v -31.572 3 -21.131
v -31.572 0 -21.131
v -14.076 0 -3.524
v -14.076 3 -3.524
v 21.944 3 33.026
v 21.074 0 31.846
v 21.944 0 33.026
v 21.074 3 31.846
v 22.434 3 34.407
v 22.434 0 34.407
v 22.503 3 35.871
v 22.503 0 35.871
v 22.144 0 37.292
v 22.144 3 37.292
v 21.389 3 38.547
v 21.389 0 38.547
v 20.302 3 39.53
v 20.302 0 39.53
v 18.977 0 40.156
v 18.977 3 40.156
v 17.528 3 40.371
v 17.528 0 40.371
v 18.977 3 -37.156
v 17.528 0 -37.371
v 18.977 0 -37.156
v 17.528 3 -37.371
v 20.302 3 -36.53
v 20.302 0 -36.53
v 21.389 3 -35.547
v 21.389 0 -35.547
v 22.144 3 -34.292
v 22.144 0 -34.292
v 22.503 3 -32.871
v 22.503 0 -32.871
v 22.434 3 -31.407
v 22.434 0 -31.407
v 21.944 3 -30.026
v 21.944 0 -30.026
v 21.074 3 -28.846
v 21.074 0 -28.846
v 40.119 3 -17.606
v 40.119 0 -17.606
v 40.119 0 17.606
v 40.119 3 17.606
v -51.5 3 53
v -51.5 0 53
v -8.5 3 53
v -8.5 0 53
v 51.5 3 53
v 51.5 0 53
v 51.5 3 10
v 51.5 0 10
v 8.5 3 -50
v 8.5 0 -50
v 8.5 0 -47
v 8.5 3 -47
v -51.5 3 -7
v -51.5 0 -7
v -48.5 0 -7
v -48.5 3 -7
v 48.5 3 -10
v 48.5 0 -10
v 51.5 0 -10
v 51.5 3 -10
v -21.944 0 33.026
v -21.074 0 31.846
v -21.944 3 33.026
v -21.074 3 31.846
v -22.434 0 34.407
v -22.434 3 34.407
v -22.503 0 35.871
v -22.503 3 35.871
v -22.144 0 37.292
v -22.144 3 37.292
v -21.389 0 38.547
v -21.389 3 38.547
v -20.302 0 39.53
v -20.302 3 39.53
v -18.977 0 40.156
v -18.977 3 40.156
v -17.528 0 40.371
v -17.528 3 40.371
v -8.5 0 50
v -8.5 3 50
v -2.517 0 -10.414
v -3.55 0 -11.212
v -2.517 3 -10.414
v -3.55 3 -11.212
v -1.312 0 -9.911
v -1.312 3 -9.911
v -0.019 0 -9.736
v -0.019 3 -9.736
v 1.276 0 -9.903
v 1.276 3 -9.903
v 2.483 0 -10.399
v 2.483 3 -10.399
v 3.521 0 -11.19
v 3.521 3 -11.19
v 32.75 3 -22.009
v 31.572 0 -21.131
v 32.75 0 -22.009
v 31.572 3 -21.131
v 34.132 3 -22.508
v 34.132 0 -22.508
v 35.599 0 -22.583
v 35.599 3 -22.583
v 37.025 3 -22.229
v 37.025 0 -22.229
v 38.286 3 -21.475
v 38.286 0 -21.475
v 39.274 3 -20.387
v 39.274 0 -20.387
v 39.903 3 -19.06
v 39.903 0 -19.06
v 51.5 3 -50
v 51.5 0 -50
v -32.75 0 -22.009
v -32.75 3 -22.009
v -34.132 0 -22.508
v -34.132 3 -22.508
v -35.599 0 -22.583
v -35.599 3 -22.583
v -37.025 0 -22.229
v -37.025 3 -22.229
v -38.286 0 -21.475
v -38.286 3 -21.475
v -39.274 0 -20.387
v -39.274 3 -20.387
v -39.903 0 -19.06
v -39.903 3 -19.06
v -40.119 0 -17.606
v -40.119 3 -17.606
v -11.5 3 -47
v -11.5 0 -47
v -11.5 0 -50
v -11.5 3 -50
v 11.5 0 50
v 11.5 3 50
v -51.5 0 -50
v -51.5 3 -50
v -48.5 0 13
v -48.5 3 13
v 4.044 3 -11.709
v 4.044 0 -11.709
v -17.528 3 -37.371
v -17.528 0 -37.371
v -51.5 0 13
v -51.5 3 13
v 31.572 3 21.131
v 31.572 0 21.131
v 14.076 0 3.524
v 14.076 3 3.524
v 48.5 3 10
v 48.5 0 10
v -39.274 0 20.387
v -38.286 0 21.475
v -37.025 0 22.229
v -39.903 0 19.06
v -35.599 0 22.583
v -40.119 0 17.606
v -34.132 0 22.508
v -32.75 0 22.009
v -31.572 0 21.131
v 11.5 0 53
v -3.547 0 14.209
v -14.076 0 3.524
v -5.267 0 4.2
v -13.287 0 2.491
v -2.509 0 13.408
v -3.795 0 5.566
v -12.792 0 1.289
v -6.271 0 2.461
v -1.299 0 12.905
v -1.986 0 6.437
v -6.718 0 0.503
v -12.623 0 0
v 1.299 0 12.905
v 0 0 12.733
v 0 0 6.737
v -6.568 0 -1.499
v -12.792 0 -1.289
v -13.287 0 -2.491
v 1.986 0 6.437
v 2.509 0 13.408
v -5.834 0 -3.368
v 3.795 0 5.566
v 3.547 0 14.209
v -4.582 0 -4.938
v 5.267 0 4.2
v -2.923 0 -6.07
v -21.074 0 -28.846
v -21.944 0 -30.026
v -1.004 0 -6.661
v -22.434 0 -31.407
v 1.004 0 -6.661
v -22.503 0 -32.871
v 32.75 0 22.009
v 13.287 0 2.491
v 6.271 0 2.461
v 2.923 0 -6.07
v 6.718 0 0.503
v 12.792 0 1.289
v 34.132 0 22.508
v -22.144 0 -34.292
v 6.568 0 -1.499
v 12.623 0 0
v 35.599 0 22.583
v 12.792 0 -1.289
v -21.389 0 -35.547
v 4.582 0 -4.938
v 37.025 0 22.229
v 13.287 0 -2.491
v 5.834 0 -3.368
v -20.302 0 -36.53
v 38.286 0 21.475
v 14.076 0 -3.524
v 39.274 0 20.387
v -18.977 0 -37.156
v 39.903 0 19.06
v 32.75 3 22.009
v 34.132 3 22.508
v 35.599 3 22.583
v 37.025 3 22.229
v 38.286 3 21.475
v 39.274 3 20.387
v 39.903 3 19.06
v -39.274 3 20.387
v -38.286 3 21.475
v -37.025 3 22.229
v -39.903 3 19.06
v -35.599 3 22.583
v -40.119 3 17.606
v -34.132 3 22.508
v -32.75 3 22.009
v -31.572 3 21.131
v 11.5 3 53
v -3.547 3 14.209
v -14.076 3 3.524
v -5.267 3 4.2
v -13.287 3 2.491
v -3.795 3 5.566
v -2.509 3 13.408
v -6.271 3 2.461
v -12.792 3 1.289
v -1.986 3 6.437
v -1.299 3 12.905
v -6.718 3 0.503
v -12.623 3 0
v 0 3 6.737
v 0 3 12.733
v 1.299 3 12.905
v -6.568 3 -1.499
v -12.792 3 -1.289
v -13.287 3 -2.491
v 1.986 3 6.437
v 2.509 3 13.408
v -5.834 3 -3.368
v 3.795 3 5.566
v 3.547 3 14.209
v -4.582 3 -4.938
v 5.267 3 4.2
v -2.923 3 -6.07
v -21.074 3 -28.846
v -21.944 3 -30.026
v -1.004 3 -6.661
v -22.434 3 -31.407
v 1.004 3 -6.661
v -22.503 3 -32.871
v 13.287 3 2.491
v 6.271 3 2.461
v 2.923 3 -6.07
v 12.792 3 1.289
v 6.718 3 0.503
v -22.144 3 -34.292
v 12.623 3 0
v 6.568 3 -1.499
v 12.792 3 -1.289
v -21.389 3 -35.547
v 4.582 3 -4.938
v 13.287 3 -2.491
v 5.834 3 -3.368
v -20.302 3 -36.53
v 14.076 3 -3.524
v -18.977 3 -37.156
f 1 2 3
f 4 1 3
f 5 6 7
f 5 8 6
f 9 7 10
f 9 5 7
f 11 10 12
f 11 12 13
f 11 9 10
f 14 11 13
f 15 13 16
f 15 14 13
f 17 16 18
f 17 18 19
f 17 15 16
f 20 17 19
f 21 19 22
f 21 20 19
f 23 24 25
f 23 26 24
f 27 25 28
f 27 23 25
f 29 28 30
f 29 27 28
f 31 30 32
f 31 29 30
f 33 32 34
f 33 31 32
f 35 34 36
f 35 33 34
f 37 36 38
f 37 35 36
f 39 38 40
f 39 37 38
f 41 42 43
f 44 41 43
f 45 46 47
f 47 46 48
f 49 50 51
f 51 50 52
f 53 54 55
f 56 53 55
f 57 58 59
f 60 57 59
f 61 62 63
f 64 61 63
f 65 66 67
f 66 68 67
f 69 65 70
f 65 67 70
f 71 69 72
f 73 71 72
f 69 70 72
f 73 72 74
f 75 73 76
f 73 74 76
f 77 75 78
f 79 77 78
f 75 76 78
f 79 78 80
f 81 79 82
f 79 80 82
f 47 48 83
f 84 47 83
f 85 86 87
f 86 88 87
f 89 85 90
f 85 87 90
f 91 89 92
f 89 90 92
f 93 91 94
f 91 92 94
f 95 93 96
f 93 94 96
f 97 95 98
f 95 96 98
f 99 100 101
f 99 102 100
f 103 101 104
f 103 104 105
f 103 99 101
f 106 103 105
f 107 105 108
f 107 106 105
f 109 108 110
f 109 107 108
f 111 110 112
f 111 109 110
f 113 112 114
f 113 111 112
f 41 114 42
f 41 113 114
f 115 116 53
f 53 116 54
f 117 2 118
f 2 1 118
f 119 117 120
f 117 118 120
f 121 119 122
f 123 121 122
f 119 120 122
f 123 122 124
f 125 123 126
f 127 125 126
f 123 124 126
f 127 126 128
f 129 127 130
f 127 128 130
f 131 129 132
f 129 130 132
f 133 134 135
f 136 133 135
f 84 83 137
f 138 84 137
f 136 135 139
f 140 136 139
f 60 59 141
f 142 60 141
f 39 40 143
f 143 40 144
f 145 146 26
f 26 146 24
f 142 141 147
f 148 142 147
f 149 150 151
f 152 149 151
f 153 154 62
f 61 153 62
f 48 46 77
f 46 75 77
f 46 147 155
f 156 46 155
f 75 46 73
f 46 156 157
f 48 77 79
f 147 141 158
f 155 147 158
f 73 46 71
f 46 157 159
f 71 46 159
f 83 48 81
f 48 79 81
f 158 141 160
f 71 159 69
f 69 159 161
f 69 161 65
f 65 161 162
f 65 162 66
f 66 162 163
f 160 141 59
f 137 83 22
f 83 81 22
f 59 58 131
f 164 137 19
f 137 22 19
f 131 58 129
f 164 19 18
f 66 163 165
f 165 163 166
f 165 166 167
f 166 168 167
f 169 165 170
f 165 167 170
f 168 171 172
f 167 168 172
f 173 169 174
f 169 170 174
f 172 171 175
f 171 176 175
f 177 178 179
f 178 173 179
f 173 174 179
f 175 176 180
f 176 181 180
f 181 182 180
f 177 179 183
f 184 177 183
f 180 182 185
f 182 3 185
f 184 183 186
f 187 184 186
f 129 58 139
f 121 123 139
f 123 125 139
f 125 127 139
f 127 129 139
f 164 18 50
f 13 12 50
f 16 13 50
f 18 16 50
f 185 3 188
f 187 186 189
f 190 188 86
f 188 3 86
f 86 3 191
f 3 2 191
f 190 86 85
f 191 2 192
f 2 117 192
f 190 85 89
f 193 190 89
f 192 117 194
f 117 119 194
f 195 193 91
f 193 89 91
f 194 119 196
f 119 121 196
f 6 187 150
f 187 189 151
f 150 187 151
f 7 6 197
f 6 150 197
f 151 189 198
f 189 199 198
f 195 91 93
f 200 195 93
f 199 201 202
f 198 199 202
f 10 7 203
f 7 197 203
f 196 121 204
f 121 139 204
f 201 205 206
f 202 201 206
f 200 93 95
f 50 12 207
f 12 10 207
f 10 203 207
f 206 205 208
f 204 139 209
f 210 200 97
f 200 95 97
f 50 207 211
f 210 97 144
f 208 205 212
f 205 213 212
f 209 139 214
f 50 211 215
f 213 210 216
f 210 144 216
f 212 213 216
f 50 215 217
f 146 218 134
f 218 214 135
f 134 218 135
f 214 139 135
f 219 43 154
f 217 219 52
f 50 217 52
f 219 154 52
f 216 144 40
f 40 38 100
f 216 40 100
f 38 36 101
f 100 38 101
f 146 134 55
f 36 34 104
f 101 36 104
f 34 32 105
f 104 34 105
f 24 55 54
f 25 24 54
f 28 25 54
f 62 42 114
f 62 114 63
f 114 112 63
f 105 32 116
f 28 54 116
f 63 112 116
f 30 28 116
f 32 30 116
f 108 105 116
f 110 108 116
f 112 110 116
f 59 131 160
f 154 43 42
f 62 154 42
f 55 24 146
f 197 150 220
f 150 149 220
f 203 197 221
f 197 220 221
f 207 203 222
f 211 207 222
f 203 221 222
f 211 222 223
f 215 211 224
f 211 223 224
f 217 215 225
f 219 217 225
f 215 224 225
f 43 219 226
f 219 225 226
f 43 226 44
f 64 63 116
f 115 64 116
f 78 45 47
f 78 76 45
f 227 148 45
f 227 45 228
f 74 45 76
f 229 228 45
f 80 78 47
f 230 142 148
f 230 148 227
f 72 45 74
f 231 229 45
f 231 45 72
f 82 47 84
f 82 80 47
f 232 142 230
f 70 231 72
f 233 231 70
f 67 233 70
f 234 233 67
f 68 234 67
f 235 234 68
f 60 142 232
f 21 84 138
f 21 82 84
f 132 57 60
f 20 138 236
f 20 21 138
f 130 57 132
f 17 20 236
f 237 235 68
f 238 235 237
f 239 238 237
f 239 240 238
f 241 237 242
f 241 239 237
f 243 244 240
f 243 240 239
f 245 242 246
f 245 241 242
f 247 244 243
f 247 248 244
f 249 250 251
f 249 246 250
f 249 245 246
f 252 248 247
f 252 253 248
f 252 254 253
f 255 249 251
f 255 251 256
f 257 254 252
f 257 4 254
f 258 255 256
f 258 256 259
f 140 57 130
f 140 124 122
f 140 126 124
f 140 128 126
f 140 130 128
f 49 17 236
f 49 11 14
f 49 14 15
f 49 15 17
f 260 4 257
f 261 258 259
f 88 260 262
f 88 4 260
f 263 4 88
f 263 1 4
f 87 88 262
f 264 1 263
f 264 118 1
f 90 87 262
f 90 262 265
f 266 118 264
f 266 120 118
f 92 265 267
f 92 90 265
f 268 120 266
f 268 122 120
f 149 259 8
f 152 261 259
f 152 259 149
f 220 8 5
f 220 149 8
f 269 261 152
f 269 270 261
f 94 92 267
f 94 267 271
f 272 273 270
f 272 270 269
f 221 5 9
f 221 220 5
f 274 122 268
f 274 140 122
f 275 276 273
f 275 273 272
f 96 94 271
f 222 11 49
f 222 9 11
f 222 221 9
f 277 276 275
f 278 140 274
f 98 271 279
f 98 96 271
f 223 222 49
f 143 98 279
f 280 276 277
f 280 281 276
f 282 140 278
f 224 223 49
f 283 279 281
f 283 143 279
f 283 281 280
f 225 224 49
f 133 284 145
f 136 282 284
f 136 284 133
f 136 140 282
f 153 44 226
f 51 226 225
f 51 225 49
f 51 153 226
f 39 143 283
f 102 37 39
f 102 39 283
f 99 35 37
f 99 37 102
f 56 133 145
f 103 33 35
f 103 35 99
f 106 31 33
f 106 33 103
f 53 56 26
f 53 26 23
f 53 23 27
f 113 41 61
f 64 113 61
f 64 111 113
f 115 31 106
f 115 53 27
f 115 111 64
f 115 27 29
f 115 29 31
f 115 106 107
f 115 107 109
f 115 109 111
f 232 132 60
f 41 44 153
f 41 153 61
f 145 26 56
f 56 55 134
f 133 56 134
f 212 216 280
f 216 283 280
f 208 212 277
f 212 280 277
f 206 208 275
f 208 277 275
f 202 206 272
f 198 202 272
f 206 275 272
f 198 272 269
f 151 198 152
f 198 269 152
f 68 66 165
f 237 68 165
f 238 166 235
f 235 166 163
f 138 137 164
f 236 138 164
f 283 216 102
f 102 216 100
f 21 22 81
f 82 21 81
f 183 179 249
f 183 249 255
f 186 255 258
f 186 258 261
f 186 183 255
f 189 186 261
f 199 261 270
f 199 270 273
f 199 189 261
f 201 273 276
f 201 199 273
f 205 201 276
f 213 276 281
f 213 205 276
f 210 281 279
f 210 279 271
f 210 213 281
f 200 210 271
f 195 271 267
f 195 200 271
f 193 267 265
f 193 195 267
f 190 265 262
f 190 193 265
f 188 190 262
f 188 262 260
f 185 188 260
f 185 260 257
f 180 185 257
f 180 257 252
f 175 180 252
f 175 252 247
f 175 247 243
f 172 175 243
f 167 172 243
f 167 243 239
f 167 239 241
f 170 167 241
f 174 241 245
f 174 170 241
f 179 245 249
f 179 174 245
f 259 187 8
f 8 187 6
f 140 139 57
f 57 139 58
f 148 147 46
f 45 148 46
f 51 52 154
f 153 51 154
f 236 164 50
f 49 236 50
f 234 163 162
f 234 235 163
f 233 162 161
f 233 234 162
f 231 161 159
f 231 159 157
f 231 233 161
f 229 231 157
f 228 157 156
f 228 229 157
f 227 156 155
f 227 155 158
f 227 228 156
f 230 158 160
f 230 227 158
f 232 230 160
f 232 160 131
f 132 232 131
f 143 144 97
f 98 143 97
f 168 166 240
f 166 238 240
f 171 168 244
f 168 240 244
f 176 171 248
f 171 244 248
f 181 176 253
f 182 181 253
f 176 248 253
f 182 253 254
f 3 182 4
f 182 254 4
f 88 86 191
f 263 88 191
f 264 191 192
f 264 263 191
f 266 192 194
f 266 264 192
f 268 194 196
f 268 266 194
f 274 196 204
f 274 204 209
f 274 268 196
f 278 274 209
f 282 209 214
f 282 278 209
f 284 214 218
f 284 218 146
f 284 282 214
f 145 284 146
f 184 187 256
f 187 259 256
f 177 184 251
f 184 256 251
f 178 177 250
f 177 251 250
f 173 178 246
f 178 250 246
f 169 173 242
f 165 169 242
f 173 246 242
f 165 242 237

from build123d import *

# Parameters (mm, degrees)
SKETCH1_R           = 6.736700536
BOSS_EXTRUDE1_DEPTH = 3
FILLET1_R           = 5
FILLET2_R           = 5


with BuildPart() as part:
    # Sketch1 → Boss-Extrude1 (new body)
    with BuildSketch(Plane(origin=(0, 0, 0), x_dir=(1, 0, 0), z_dir=(0, 1, 0))):
        Polygon((-51.5, -13), (-51.5, -53), (-8.5, -53), (-8.5, -50), (11.5, -50), (11.5, -53), (51.5, -53), (51.5, -10), (48.5, -10), (48.5, 10), (51.5, 10), (51.5, 50), (8.5, 50), (8.5, 47), (-11.5, 47), (-11.5, 50), (-51.5, 50), (-51.5, 7), (-48.5, 7), (-48.5, -13), align=None)
        Polygon((-40.119028072, -29.730929333), (-40.119028072, 29.730929333), (-10.573569788, 0), align=None, mode=Mode.SUBTRACT)
        Polygon((-29.545458284, 37.370874503), (29.545458284, 37.370874503), (4.043573282, 11.708901907), (-0.025303783, 7.665407798), align=None, mode=Mode.SUBTRACT)
        Polygon((40.119028072, 29.730929333), (40.119028072, -29.730929333), (10.573569788, 0), align=None, mode=Mode.SUBTRACT)
        Polygon((29.545458284, -40.370874503), (-29.545458284, -40.370874503), (0, -10.63994517), align=None, mode=Mode.SUBTRACT)
        with Locations(Location((0, 0, 0), (0, 0, 270))):
            Circle(SKETCH1_R, mode=Mode.SUBTRACT)
    extrude(amount=BOSS_EXTRUDE1_DEPTH)

    # Fillet1
    fillet1_edges = [part.edges().sort_by_distance(p)[0] for p in [
        (29.545458284, 1.5, 40.370874503),
        (-29.545458284, 1.5, 40.370874503),
        (-40.119028072, 1.5, -29.730929333),
        (-40.119028072, 1.5, 29.730929333),
        (29.545458284, 1.5, -37.370874503),
        (-29.545458284, 1.5, -37.370874503),
        (40.119028072, 1.5, 29.730929333),
        (40.119028072, 1.5, -29.730929333),
    ]]
    fillet(fillet1_edges, radius=FILLET1_R)

    # Fillet2
    fillet2_edges = [part.edges().sort_by_distance(p)[0] for p in [
        (0, 1.5, 10.63994517),
        (-10.573569788, 1.5, 0),
        (-0.025303783, 1.5, -7.665407798),
        (10.573569788, 1.5, 0),
    ]]
    fillet(fillet2_edges, radius=FILLET2_R)


solid = part.part
